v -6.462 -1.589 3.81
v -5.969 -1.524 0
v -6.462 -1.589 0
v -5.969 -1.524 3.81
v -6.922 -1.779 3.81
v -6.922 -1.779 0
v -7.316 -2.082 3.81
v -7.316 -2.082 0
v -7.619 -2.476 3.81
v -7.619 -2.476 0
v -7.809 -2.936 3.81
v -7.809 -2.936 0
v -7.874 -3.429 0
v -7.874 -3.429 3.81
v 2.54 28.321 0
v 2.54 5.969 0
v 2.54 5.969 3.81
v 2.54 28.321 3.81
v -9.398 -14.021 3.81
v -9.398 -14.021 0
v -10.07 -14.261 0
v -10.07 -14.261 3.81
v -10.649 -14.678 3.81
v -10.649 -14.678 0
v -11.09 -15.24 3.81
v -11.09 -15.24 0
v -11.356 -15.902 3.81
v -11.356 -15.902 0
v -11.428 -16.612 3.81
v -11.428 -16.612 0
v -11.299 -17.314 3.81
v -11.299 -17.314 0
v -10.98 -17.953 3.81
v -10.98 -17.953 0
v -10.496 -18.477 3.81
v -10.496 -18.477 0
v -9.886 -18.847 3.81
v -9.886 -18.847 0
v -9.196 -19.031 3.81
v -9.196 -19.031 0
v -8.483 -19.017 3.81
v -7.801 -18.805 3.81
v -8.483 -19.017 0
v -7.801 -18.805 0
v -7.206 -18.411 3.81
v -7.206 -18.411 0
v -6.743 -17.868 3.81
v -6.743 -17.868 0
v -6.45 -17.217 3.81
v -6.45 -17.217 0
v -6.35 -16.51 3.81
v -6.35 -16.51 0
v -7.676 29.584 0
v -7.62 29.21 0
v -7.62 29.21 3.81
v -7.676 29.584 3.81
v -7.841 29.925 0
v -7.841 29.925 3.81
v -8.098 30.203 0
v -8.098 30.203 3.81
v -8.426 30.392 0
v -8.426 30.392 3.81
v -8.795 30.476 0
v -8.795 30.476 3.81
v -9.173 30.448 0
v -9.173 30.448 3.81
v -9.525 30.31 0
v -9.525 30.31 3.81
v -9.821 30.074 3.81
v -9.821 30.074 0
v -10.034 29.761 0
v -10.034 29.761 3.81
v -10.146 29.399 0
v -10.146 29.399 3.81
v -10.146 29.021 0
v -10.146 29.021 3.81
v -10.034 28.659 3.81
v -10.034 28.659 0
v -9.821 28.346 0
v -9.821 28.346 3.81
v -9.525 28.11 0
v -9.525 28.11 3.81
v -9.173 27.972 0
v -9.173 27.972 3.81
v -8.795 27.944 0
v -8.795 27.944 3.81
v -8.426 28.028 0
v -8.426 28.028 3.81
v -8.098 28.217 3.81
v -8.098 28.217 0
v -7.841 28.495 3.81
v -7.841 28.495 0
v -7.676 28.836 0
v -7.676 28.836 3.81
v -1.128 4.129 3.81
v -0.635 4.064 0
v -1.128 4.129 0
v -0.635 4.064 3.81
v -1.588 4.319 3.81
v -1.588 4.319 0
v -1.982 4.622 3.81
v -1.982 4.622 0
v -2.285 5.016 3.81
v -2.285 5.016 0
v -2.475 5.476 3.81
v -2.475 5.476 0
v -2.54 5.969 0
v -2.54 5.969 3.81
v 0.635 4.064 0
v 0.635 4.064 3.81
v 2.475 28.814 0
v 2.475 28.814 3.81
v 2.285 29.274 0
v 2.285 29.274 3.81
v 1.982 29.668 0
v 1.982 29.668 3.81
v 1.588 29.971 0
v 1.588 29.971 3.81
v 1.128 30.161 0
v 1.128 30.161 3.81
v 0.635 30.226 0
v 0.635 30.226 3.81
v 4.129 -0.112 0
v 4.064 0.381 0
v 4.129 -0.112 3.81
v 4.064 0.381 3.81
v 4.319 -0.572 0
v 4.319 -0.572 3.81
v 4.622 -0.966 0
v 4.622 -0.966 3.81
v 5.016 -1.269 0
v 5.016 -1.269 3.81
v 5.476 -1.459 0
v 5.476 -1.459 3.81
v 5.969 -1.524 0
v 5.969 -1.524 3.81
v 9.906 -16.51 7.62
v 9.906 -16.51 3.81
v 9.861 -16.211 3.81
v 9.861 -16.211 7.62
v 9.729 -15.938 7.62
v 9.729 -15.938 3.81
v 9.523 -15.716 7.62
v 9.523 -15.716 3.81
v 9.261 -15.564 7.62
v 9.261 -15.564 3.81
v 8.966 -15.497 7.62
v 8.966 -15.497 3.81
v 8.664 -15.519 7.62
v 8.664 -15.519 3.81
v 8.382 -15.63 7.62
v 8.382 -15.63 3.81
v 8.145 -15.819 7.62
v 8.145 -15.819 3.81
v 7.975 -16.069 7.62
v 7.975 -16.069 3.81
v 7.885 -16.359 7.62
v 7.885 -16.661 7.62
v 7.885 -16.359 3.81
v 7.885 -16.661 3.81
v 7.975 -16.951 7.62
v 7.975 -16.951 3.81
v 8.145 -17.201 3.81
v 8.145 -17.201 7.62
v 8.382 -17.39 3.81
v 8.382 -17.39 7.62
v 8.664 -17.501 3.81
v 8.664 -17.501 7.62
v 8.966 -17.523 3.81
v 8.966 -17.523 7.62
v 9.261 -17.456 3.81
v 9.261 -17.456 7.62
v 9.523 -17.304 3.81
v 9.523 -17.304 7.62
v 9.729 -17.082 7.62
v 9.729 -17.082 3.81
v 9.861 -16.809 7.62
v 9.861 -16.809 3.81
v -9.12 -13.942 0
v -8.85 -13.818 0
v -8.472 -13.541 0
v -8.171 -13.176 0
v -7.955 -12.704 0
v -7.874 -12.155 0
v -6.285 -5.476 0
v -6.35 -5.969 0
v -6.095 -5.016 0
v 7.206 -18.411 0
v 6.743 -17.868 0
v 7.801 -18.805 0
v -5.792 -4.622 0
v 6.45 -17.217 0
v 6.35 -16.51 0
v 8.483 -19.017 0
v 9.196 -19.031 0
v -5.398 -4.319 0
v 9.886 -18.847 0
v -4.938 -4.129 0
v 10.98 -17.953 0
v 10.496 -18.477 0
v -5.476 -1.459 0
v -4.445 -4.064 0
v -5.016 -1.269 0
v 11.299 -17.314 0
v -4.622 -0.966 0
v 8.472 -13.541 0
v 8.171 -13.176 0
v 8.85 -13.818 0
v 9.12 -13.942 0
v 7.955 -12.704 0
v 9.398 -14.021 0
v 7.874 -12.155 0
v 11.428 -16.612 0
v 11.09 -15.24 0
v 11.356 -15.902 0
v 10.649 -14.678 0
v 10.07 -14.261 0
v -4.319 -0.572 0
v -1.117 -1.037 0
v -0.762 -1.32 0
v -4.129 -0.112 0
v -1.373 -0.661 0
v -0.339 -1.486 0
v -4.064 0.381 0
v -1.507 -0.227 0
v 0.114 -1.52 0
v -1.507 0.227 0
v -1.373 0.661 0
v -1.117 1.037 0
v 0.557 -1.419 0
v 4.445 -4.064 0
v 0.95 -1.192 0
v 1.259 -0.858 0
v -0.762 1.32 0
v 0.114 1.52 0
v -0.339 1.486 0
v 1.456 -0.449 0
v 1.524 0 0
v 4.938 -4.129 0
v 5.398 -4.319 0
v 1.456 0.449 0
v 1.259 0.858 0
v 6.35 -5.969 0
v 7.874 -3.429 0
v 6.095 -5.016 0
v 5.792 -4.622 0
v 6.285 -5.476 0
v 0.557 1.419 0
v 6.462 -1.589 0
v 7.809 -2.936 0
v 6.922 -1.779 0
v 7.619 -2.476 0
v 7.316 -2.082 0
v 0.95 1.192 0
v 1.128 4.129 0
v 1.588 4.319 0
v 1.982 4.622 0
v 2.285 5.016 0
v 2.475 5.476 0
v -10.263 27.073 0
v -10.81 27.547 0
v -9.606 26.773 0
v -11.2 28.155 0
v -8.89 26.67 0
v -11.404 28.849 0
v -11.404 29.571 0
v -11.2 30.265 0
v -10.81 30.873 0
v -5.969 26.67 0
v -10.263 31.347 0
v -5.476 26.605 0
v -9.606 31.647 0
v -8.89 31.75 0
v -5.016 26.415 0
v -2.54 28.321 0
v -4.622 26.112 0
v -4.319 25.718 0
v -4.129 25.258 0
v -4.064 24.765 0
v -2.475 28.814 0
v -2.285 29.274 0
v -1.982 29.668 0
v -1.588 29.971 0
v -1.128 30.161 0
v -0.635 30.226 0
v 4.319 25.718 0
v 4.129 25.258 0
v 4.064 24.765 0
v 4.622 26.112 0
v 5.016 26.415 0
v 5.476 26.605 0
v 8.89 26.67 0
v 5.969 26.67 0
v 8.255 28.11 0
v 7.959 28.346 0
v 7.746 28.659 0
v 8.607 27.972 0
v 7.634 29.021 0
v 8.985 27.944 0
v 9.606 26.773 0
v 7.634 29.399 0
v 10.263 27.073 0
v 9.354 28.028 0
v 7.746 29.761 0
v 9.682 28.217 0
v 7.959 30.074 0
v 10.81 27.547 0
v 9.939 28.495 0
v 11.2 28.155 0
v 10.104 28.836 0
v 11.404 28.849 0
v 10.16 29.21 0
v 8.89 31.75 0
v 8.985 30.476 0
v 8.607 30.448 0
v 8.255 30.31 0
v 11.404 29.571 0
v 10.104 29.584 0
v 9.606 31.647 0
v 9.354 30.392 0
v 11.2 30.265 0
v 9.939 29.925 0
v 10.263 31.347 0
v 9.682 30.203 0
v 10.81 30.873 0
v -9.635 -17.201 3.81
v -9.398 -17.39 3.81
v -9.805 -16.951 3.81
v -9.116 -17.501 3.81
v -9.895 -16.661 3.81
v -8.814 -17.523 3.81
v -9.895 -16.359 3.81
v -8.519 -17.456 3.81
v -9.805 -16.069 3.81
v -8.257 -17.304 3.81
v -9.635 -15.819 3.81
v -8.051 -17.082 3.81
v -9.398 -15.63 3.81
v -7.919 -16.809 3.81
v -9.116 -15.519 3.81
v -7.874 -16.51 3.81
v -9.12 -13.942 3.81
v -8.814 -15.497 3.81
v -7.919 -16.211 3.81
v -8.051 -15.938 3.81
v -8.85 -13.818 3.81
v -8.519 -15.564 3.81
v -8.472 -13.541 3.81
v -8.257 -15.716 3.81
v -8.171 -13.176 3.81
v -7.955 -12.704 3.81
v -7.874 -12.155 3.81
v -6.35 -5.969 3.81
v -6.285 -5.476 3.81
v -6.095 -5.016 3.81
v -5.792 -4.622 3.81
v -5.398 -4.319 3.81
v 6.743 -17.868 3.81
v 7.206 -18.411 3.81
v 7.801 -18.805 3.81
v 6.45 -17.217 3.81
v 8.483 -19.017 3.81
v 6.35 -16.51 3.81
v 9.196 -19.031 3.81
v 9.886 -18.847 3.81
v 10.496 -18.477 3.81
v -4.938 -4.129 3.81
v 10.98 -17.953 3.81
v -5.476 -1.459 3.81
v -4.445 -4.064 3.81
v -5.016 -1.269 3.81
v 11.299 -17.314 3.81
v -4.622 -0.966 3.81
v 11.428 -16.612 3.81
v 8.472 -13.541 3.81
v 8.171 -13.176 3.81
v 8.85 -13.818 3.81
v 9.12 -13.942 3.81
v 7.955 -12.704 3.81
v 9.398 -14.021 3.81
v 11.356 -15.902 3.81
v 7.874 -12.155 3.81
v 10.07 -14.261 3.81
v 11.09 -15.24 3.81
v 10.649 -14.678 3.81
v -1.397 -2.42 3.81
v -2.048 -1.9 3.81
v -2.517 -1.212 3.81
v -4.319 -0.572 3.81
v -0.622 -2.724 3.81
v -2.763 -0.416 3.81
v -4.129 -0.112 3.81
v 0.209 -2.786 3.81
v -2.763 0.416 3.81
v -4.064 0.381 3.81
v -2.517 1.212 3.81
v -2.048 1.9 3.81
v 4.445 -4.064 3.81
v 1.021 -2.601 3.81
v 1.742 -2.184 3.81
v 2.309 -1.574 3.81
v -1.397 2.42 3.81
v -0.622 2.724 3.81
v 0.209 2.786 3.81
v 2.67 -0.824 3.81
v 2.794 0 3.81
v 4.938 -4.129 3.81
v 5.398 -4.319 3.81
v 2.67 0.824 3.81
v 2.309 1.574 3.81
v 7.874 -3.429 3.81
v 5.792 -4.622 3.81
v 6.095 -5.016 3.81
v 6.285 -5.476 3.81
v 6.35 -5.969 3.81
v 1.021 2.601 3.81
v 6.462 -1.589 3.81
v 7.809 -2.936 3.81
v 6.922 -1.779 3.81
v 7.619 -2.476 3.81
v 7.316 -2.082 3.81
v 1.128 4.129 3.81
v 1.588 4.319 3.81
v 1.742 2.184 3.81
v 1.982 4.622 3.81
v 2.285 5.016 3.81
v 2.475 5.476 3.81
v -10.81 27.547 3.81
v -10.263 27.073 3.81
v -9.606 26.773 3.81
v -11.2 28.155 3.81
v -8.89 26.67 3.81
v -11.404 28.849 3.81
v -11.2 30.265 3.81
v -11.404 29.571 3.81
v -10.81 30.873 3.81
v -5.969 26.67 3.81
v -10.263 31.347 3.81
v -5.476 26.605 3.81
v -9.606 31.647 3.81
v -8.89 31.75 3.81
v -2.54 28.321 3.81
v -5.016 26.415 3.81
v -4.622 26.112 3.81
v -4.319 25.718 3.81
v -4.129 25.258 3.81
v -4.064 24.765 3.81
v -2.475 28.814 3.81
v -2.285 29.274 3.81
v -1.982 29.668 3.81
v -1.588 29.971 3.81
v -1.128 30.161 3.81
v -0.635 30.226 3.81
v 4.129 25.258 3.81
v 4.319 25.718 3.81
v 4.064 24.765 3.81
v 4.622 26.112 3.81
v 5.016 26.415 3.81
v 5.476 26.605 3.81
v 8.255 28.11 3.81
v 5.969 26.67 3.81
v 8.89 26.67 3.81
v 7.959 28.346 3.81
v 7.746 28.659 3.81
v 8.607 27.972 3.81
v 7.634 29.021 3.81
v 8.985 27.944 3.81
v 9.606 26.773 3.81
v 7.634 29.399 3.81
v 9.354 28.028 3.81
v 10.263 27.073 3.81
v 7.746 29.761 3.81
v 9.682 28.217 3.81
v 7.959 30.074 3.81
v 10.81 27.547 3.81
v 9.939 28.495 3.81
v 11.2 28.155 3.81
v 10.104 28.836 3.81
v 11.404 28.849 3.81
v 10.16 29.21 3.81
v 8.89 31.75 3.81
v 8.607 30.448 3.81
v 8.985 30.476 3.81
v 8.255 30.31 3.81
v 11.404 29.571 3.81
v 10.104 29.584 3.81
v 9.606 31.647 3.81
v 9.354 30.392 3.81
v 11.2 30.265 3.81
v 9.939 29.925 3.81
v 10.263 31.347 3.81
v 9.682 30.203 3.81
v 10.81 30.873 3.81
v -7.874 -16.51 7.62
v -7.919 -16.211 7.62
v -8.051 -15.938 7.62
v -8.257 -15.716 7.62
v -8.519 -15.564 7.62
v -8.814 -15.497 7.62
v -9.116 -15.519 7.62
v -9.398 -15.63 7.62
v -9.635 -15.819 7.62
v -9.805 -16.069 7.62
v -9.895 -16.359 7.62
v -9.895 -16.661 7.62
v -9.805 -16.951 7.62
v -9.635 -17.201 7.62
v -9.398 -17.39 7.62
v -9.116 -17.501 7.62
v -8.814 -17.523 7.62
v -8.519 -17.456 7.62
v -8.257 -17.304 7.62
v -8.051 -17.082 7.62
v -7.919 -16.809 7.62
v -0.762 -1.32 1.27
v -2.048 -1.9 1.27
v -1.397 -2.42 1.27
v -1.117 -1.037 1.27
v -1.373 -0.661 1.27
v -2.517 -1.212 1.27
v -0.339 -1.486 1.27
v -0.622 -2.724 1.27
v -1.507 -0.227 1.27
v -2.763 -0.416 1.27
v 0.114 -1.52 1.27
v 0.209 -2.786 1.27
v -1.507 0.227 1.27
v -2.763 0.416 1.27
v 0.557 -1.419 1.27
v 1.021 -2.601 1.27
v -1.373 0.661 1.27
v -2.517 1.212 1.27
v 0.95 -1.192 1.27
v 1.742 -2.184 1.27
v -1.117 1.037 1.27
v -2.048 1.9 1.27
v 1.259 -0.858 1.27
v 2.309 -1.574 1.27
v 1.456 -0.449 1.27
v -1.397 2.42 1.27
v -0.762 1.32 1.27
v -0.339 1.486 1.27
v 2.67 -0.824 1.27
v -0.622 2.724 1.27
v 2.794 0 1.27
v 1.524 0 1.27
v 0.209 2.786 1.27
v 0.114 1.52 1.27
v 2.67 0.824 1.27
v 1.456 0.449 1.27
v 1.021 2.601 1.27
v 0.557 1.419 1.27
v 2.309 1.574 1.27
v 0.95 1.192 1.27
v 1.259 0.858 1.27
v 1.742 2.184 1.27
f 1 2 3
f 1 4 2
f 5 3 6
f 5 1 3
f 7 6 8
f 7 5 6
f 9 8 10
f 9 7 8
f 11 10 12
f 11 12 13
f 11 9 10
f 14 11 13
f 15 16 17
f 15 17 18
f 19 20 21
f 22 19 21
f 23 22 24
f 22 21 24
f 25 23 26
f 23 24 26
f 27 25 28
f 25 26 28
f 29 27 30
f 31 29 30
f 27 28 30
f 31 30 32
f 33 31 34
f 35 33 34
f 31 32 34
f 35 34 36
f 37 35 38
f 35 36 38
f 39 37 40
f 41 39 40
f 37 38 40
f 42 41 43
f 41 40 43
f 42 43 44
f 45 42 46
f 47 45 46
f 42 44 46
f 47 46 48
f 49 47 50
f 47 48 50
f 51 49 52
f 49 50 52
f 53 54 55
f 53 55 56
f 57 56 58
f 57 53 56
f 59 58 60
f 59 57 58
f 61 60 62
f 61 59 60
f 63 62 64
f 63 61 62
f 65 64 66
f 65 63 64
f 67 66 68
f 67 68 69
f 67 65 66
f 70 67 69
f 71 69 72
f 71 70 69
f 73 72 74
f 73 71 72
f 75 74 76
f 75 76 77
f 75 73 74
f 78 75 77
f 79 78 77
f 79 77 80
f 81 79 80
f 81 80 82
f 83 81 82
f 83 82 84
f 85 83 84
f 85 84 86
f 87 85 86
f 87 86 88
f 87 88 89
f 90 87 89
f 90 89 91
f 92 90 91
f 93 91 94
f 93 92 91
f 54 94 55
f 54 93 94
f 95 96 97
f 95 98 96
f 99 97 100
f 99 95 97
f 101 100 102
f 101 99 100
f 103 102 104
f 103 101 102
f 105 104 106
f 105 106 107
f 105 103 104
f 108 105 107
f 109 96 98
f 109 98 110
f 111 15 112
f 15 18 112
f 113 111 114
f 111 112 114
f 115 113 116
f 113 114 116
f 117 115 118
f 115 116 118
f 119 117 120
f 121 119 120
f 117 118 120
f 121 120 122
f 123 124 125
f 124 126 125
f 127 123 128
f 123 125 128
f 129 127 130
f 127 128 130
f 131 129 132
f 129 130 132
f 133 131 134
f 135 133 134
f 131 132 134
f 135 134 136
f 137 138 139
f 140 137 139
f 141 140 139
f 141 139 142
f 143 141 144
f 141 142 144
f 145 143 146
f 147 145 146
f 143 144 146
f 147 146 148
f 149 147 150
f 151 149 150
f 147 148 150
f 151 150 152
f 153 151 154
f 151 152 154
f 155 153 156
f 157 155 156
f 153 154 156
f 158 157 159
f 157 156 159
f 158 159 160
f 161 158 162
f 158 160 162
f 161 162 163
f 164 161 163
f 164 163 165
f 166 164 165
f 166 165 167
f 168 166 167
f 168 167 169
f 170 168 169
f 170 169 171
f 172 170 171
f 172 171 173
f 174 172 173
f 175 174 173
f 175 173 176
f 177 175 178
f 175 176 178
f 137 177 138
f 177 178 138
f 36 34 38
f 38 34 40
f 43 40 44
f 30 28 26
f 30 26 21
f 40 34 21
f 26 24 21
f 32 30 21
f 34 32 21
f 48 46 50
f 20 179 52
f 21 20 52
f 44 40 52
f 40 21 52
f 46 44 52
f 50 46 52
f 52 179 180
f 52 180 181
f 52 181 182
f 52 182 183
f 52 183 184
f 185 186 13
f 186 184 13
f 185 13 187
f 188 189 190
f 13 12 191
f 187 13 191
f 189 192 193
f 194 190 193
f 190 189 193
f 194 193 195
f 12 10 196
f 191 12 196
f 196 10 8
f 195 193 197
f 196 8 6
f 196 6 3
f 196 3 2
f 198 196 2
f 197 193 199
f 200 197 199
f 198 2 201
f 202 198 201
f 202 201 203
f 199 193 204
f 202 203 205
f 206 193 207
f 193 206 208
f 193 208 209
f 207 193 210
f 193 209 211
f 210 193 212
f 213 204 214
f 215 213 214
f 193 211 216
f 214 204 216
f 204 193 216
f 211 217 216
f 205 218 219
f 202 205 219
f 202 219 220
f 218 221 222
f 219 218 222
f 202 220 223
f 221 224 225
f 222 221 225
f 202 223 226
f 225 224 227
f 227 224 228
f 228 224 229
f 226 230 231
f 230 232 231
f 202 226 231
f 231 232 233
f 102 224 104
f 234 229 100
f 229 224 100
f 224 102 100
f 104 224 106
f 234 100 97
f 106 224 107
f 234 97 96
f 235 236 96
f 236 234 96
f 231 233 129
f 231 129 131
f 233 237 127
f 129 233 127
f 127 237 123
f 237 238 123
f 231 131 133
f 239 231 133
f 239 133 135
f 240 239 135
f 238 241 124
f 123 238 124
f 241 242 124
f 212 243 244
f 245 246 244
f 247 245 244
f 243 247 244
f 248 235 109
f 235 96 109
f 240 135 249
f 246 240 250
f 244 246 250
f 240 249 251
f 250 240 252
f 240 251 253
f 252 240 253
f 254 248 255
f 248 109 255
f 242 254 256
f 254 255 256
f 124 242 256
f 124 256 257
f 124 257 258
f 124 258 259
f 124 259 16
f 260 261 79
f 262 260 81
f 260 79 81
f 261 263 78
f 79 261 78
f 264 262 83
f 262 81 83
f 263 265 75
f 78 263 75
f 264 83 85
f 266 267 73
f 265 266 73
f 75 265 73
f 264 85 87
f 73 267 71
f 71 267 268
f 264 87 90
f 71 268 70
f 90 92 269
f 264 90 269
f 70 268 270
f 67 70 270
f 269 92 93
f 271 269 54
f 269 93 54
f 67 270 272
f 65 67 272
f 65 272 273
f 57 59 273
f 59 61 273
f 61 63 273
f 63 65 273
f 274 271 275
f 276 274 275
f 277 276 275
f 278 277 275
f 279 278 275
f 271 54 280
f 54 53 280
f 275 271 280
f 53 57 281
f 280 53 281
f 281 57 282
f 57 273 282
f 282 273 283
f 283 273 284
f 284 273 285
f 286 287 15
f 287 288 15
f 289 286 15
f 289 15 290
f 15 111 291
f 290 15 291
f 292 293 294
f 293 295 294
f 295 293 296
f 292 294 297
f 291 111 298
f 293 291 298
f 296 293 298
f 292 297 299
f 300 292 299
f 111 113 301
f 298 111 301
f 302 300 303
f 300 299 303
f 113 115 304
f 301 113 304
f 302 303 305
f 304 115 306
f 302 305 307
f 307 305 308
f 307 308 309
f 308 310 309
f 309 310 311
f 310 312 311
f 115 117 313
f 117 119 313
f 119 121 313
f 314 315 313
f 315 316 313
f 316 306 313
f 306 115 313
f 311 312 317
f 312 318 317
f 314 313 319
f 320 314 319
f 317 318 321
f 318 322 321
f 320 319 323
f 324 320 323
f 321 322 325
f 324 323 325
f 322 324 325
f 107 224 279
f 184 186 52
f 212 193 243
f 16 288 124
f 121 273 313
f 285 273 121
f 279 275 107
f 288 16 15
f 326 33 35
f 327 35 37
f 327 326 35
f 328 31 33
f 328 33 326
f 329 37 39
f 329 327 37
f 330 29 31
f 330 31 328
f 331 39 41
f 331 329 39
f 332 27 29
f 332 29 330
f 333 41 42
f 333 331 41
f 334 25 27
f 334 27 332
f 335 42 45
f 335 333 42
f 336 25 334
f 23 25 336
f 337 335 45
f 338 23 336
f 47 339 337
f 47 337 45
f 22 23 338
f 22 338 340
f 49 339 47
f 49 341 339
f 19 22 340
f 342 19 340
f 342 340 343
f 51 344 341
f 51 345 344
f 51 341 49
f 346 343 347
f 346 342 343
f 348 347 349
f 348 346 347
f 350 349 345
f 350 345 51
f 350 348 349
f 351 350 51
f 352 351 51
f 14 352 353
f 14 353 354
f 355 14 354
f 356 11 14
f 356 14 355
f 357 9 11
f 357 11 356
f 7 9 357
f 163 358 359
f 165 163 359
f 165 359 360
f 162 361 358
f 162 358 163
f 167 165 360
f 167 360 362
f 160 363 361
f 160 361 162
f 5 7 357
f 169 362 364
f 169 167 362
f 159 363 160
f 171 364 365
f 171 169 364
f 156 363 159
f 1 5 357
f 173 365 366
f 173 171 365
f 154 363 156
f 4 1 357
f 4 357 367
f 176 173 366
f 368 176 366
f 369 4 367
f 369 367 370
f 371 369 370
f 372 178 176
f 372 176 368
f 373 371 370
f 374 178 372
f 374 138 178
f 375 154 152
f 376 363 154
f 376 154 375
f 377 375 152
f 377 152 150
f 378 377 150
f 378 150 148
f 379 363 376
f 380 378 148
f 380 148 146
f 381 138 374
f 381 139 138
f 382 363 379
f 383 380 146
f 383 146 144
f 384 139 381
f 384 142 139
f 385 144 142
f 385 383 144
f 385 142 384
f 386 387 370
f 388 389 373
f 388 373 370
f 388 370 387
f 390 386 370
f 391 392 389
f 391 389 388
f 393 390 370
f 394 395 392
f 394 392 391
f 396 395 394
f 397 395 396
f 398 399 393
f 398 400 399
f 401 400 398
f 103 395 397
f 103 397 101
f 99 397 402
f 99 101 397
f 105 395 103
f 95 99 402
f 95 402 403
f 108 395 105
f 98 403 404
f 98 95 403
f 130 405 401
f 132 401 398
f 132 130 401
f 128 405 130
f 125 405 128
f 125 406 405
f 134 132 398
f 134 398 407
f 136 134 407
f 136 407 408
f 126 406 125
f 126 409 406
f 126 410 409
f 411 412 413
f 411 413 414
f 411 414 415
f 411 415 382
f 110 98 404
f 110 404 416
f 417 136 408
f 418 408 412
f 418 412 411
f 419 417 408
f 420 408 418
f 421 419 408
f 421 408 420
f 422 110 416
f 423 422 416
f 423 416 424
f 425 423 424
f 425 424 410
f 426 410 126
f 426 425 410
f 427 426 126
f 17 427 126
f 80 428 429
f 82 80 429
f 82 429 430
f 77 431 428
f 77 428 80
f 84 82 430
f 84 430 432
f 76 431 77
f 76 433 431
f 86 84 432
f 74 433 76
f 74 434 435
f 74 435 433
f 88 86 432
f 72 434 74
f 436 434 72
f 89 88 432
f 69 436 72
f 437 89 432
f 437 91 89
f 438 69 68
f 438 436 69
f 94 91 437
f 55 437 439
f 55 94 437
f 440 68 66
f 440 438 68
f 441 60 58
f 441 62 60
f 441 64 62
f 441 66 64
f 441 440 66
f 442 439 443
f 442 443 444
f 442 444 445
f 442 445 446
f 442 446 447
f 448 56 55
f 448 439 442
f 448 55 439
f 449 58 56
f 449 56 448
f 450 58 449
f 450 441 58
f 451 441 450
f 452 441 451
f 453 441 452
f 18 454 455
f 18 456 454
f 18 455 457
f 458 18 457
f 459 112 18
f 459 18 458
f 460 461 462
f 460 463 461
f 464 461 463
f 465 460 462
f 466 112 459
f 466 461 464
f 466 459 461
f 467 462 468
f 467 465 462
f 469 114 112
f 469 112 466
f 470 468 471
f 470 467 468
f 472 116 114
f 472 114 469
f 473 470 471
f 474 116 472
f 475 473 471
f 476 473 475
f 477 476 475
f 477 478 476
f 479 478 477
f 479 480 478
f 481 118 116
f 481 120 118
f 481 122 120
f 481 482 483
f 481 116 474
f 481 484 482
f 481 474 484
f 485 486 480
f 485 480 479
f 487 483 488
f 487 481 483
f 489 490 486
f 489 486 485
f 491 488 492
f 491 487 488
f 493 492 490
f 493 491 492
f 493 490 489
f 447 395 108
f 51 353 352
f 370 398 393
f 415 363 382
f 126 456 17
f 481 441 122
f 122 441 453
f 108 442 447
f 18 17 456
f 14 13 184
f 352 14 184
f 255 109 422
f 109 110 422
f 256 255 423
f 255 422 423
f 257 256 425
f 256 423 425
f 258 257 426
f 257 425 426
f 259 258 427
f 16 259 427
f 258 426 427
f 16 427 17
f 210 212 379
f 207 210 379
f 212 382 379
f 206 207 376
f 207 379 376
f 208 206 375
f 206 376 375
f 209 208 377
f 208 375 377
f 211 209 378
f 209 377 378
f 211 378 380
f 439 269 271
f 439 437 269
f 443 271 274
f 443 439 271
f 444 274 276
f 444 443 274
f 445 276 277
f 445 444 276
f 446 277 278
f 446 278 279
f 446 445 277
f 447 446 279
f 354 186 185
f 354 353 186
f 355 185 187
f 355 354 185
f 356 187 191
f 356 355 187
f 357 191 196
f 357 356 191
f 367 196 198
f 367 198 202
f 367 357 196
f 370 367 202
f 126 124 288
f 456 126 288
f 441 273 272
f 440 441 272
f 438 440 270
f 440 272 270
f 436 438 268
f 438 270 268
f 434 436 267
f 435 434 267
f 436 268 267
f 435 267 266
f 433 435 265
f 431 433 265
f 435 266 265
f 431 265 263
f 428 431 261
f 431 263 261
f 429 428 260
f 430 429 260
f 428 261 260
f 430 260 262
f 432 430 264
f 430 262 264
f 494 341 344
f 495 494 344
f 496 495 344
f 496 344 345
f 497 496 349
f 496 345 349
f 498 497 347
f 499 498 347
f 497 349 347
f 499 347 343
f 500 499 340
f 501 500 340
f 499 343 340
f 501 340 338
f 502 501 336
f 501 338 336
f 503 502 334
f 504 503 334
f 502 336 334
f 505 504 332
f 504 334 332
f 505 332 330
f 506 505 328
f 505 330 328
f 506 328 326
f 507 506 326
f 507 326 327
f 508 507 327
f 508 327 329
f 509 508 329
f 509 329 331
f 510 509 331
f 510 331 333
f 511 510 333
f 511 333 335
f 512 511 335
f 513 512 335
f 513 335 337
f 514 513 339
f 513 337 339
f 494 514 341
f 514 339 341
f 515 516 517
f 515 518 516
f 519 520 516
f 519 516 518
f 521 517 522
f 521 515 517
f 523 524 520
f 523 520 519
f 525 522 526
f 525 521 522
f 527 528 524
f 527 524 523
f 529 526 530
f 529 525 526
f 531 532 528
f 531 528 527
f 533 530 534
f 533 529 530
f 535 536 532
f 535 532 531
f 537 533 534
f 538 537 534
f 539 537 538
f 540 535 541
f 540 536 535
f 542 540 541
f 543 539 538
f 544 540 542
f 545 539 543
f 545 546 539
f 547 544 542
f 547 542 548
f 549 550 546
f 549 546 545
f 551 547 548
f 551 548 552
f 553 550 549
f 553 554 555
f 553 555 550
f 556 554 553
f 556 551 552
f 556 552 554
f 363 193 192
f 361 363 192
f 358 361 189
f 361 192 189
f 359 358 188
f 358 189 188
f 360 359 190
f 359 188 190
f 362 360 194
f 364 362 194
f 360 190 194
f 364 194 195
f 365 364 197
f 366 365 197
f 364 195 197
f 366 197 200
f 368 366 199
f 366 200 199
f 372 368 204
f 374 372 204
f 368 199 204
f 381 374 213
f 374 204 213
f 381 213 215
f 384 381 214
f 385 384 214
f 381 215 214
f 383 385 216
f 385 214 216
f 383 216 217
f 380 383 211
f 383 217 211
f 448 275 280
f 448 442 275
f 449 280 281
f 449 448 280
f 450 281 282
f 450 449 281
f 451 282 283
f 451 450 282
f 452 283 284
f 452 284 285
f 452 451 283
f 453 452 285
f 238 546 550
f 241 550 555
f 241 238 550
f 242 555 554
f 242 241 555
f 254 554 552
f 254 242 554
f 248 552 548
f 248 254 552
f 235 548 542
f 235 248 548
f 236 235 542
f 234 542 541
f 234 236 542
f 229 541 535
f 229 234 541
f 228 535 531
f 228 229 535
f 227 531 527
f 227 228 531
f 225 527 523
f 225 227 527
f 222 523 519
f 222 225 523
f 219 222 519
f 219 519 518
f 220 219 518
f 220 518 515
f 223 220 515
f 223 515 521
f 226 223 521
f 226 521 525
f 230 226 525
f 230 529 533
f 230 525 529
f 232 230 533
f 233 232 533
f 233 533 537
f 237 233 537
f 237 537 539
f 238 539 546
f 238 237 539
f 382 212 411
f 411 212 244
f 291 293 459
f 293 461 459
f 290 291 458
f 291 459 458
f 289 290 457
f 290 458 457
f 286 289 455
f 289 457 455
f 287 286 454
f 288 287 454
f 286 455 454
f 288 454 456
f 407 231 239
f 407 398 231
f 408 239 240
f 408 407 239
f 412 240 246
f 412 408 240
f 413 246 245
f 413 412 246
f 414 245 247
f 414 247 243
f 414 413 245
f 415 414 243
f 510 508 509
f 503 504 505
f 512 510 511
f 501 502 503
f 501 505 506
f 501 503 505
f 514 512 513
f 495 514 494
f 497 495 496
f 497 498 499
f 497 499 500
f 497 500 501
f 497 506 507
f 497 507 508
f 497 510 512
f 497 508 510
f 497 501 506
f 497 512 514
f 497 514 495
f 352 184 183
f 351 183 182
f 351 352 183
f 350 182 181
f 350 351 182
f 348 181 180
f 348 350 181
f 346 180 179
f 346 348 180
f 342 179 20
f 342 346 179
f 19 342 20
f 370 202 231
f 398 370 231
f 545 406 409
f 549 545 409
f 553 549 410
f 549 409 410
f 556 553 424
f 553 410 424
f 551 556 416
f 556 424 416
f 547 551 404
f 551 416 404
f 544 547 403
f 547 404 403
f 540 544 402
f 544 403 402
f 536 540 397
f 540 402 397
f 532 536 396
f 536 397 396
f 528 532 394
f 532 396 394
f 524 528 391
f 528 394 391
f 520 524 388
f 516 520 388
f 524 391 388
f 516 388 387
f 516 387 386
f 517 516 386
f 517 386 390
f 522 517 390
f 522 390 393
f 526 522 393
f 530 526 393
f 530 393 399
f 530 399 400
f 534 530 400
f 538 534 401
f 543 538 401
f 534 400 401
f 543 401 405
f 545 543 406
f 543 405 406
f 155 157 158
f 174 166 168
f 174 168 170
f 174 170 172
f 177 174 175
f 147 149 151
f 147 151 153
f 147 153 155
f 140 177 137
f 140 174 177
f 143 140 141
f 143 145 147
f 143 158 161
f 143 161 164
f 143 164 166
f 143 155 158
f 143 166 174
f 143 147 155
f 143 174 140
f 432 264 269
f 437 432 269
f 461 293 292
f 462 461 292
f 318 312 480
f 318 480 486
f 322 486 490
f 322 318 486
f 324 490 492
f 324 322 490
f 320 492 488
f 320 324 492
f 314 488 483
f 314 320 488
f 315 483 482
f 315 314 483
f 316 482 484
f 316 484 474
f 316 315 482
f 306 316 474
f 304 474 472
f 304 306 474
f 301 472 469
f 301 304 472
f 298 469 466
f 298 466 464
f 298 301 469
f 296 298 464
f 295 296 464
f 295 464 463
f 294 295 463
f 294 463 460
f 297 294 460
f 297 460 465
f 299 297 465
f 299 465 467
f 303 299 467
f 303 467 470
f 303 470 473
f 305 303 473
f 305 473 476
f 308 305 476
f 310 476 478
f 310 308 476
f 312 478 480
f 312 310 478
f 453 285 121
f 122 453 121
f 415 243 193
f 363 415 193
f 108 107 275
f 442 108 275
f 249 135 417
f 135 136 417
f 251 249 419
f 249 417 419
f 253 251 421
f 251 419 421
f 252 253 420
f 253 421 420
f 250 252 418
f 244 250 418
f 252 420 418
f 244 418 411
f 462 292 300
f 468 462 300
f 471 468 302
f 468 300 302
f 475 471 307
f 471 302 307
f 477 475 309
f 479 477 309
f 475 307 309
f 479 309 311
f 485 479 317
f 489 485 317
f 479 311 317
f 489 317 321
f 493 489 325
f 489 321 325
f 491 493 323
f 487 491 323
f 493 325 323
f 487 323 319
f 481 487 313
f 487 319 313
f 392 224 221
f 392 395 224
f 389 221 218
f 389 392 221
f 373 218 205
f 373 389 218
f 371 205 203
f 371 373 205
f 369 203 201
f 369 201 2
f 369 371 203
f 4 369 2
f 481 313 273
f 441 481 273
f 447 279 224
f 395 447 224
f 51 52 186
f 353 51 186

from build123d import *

# Parameters (mm, degrees)
F0_R     = 1.524
F0_R_2   = 1.27
F0_W     = 5.08
F0_H     = 26.162
F1_DEPTH = 3.81
F2_R     = 1.90499
F3_R     = 1.016
F4_DEPTH = 3.81
F5_R     = 2.794
F6_DEPTH = 2.54


# Not quite as in the source:
# - a fillet or chamfer is up to 0.001 mm smaller than in the source, because OpenCascade refuses the exact size


with BuildPart() as f1:
    # F0 (on Top) → F1 (new body)
    with BuildSketch(Plane.XY):
        with BuildLine():
            ThreePointArc((-8.89, 31.75), (-11.43, 29.21), (-8.89, 26.67))
            Line((-8.89, 26.67), (-4.064, 26.67))
            Line((-4.064, 26.67), (-4.064, -1.524))
            Line((-4.064, -1.524), (-7.874, -1.524))
            Line((-7.874, -1.524), (-7.874, -13.97))
            Line((-7.874, -13.97), (-8.89, -13.97))
            ThreePointArc((-8.89, -13.97), (-10.6860512242, -18.3060512242), (-6.35, -16.51))
            Line((-6.35, -16.51), (-6.35, -4.064))
            Line((-6.35, -4.064), (6.35, -4.064))
            Line((6.35, -4.064), (6.35, -16.51))
            ThreePointArc((6.35, -16.51), (10.6860512242, -18.3060512242), (8.89, -13.97))
            Line((8.89, -13.97), (7.874, -13.97))
            Line((7.874, -13.97), (7.874, -1.524))
            Line((7.874, -1.524), (4.064, -1.524))
            Line((4.064, -1.524), (4.064, 26.67))
            Line((4.064, 26.67), (8.89, 26.67))
            ThreePointArc((8.89, 26.67), (11.43, 29.21), (8.89, 31.75))
            Line((8.89, 31.75), (-8.89, 31.75))
        make_face()
        Circle(F0_R, mode=Mode.SUBTRACT)
        with Locations((-8.89, 29.21)):
            Circle(F0_R_2, mode=Mode.SUBTRACT)
        with Locations((0, 17.145)):
            Rectangle(F0_W, F0_H, mode=Mode.SUBTRACT)
        with Locations((8.89, 29.21)):
            Circle(F0_R_2, mode=Mode.SUBTRACT)
    extrude(amount=F1_DEPTH)

    # F2 (radius 1.905 in the source; OpenCascade refuses exactly that, so slightly less here)
    f2_edges = [f1.edges().sort_by_distance(p)[0] for p in [
        (6.35, -4.064, 1.905),
        (-6.35, -4.064, 1.905),
        (-4.064, -1.524, 1.905),
        (-7.874, -1.524, 1.905),
        (7.874, -1.524, 1.905),
        (4.064, 26.67, 1.905),
        (4.064, -1.524, 1.905),
        (-4.064, 26.67, 1.905),
        (2.54, 30.226, 1.905),
        (-2.54, 30.226, 1.905),
        (-2.54, 4.064, 1.905),
        (2.54, 4.064, 1.905),
        (7.874, -13.97, 1.905),
        (-7.874, -13.97, 1.905),
    ]]
    fillet(f2_edges, radius=F2_R)

    # F3 (on face) → F4 (join)
    with BuildSketch(Plane.XY.offset(3.81)):
        with Locations((-8.89, -16.51)):
            Circle(F3_R)
        with Locations((8.89, -16.51)):
            Circle(F3_R)
    extrude(amount=F4_DEPTH)

    # F5 (on face) → F6 (cut)
    with BuildSketch(Plane.XY.offset(3.81)):
        Circle(F5_R)
    extrude(amount=-F6_DEPTH, mode=Mode.SUBTRACT)


solid = f1.part
